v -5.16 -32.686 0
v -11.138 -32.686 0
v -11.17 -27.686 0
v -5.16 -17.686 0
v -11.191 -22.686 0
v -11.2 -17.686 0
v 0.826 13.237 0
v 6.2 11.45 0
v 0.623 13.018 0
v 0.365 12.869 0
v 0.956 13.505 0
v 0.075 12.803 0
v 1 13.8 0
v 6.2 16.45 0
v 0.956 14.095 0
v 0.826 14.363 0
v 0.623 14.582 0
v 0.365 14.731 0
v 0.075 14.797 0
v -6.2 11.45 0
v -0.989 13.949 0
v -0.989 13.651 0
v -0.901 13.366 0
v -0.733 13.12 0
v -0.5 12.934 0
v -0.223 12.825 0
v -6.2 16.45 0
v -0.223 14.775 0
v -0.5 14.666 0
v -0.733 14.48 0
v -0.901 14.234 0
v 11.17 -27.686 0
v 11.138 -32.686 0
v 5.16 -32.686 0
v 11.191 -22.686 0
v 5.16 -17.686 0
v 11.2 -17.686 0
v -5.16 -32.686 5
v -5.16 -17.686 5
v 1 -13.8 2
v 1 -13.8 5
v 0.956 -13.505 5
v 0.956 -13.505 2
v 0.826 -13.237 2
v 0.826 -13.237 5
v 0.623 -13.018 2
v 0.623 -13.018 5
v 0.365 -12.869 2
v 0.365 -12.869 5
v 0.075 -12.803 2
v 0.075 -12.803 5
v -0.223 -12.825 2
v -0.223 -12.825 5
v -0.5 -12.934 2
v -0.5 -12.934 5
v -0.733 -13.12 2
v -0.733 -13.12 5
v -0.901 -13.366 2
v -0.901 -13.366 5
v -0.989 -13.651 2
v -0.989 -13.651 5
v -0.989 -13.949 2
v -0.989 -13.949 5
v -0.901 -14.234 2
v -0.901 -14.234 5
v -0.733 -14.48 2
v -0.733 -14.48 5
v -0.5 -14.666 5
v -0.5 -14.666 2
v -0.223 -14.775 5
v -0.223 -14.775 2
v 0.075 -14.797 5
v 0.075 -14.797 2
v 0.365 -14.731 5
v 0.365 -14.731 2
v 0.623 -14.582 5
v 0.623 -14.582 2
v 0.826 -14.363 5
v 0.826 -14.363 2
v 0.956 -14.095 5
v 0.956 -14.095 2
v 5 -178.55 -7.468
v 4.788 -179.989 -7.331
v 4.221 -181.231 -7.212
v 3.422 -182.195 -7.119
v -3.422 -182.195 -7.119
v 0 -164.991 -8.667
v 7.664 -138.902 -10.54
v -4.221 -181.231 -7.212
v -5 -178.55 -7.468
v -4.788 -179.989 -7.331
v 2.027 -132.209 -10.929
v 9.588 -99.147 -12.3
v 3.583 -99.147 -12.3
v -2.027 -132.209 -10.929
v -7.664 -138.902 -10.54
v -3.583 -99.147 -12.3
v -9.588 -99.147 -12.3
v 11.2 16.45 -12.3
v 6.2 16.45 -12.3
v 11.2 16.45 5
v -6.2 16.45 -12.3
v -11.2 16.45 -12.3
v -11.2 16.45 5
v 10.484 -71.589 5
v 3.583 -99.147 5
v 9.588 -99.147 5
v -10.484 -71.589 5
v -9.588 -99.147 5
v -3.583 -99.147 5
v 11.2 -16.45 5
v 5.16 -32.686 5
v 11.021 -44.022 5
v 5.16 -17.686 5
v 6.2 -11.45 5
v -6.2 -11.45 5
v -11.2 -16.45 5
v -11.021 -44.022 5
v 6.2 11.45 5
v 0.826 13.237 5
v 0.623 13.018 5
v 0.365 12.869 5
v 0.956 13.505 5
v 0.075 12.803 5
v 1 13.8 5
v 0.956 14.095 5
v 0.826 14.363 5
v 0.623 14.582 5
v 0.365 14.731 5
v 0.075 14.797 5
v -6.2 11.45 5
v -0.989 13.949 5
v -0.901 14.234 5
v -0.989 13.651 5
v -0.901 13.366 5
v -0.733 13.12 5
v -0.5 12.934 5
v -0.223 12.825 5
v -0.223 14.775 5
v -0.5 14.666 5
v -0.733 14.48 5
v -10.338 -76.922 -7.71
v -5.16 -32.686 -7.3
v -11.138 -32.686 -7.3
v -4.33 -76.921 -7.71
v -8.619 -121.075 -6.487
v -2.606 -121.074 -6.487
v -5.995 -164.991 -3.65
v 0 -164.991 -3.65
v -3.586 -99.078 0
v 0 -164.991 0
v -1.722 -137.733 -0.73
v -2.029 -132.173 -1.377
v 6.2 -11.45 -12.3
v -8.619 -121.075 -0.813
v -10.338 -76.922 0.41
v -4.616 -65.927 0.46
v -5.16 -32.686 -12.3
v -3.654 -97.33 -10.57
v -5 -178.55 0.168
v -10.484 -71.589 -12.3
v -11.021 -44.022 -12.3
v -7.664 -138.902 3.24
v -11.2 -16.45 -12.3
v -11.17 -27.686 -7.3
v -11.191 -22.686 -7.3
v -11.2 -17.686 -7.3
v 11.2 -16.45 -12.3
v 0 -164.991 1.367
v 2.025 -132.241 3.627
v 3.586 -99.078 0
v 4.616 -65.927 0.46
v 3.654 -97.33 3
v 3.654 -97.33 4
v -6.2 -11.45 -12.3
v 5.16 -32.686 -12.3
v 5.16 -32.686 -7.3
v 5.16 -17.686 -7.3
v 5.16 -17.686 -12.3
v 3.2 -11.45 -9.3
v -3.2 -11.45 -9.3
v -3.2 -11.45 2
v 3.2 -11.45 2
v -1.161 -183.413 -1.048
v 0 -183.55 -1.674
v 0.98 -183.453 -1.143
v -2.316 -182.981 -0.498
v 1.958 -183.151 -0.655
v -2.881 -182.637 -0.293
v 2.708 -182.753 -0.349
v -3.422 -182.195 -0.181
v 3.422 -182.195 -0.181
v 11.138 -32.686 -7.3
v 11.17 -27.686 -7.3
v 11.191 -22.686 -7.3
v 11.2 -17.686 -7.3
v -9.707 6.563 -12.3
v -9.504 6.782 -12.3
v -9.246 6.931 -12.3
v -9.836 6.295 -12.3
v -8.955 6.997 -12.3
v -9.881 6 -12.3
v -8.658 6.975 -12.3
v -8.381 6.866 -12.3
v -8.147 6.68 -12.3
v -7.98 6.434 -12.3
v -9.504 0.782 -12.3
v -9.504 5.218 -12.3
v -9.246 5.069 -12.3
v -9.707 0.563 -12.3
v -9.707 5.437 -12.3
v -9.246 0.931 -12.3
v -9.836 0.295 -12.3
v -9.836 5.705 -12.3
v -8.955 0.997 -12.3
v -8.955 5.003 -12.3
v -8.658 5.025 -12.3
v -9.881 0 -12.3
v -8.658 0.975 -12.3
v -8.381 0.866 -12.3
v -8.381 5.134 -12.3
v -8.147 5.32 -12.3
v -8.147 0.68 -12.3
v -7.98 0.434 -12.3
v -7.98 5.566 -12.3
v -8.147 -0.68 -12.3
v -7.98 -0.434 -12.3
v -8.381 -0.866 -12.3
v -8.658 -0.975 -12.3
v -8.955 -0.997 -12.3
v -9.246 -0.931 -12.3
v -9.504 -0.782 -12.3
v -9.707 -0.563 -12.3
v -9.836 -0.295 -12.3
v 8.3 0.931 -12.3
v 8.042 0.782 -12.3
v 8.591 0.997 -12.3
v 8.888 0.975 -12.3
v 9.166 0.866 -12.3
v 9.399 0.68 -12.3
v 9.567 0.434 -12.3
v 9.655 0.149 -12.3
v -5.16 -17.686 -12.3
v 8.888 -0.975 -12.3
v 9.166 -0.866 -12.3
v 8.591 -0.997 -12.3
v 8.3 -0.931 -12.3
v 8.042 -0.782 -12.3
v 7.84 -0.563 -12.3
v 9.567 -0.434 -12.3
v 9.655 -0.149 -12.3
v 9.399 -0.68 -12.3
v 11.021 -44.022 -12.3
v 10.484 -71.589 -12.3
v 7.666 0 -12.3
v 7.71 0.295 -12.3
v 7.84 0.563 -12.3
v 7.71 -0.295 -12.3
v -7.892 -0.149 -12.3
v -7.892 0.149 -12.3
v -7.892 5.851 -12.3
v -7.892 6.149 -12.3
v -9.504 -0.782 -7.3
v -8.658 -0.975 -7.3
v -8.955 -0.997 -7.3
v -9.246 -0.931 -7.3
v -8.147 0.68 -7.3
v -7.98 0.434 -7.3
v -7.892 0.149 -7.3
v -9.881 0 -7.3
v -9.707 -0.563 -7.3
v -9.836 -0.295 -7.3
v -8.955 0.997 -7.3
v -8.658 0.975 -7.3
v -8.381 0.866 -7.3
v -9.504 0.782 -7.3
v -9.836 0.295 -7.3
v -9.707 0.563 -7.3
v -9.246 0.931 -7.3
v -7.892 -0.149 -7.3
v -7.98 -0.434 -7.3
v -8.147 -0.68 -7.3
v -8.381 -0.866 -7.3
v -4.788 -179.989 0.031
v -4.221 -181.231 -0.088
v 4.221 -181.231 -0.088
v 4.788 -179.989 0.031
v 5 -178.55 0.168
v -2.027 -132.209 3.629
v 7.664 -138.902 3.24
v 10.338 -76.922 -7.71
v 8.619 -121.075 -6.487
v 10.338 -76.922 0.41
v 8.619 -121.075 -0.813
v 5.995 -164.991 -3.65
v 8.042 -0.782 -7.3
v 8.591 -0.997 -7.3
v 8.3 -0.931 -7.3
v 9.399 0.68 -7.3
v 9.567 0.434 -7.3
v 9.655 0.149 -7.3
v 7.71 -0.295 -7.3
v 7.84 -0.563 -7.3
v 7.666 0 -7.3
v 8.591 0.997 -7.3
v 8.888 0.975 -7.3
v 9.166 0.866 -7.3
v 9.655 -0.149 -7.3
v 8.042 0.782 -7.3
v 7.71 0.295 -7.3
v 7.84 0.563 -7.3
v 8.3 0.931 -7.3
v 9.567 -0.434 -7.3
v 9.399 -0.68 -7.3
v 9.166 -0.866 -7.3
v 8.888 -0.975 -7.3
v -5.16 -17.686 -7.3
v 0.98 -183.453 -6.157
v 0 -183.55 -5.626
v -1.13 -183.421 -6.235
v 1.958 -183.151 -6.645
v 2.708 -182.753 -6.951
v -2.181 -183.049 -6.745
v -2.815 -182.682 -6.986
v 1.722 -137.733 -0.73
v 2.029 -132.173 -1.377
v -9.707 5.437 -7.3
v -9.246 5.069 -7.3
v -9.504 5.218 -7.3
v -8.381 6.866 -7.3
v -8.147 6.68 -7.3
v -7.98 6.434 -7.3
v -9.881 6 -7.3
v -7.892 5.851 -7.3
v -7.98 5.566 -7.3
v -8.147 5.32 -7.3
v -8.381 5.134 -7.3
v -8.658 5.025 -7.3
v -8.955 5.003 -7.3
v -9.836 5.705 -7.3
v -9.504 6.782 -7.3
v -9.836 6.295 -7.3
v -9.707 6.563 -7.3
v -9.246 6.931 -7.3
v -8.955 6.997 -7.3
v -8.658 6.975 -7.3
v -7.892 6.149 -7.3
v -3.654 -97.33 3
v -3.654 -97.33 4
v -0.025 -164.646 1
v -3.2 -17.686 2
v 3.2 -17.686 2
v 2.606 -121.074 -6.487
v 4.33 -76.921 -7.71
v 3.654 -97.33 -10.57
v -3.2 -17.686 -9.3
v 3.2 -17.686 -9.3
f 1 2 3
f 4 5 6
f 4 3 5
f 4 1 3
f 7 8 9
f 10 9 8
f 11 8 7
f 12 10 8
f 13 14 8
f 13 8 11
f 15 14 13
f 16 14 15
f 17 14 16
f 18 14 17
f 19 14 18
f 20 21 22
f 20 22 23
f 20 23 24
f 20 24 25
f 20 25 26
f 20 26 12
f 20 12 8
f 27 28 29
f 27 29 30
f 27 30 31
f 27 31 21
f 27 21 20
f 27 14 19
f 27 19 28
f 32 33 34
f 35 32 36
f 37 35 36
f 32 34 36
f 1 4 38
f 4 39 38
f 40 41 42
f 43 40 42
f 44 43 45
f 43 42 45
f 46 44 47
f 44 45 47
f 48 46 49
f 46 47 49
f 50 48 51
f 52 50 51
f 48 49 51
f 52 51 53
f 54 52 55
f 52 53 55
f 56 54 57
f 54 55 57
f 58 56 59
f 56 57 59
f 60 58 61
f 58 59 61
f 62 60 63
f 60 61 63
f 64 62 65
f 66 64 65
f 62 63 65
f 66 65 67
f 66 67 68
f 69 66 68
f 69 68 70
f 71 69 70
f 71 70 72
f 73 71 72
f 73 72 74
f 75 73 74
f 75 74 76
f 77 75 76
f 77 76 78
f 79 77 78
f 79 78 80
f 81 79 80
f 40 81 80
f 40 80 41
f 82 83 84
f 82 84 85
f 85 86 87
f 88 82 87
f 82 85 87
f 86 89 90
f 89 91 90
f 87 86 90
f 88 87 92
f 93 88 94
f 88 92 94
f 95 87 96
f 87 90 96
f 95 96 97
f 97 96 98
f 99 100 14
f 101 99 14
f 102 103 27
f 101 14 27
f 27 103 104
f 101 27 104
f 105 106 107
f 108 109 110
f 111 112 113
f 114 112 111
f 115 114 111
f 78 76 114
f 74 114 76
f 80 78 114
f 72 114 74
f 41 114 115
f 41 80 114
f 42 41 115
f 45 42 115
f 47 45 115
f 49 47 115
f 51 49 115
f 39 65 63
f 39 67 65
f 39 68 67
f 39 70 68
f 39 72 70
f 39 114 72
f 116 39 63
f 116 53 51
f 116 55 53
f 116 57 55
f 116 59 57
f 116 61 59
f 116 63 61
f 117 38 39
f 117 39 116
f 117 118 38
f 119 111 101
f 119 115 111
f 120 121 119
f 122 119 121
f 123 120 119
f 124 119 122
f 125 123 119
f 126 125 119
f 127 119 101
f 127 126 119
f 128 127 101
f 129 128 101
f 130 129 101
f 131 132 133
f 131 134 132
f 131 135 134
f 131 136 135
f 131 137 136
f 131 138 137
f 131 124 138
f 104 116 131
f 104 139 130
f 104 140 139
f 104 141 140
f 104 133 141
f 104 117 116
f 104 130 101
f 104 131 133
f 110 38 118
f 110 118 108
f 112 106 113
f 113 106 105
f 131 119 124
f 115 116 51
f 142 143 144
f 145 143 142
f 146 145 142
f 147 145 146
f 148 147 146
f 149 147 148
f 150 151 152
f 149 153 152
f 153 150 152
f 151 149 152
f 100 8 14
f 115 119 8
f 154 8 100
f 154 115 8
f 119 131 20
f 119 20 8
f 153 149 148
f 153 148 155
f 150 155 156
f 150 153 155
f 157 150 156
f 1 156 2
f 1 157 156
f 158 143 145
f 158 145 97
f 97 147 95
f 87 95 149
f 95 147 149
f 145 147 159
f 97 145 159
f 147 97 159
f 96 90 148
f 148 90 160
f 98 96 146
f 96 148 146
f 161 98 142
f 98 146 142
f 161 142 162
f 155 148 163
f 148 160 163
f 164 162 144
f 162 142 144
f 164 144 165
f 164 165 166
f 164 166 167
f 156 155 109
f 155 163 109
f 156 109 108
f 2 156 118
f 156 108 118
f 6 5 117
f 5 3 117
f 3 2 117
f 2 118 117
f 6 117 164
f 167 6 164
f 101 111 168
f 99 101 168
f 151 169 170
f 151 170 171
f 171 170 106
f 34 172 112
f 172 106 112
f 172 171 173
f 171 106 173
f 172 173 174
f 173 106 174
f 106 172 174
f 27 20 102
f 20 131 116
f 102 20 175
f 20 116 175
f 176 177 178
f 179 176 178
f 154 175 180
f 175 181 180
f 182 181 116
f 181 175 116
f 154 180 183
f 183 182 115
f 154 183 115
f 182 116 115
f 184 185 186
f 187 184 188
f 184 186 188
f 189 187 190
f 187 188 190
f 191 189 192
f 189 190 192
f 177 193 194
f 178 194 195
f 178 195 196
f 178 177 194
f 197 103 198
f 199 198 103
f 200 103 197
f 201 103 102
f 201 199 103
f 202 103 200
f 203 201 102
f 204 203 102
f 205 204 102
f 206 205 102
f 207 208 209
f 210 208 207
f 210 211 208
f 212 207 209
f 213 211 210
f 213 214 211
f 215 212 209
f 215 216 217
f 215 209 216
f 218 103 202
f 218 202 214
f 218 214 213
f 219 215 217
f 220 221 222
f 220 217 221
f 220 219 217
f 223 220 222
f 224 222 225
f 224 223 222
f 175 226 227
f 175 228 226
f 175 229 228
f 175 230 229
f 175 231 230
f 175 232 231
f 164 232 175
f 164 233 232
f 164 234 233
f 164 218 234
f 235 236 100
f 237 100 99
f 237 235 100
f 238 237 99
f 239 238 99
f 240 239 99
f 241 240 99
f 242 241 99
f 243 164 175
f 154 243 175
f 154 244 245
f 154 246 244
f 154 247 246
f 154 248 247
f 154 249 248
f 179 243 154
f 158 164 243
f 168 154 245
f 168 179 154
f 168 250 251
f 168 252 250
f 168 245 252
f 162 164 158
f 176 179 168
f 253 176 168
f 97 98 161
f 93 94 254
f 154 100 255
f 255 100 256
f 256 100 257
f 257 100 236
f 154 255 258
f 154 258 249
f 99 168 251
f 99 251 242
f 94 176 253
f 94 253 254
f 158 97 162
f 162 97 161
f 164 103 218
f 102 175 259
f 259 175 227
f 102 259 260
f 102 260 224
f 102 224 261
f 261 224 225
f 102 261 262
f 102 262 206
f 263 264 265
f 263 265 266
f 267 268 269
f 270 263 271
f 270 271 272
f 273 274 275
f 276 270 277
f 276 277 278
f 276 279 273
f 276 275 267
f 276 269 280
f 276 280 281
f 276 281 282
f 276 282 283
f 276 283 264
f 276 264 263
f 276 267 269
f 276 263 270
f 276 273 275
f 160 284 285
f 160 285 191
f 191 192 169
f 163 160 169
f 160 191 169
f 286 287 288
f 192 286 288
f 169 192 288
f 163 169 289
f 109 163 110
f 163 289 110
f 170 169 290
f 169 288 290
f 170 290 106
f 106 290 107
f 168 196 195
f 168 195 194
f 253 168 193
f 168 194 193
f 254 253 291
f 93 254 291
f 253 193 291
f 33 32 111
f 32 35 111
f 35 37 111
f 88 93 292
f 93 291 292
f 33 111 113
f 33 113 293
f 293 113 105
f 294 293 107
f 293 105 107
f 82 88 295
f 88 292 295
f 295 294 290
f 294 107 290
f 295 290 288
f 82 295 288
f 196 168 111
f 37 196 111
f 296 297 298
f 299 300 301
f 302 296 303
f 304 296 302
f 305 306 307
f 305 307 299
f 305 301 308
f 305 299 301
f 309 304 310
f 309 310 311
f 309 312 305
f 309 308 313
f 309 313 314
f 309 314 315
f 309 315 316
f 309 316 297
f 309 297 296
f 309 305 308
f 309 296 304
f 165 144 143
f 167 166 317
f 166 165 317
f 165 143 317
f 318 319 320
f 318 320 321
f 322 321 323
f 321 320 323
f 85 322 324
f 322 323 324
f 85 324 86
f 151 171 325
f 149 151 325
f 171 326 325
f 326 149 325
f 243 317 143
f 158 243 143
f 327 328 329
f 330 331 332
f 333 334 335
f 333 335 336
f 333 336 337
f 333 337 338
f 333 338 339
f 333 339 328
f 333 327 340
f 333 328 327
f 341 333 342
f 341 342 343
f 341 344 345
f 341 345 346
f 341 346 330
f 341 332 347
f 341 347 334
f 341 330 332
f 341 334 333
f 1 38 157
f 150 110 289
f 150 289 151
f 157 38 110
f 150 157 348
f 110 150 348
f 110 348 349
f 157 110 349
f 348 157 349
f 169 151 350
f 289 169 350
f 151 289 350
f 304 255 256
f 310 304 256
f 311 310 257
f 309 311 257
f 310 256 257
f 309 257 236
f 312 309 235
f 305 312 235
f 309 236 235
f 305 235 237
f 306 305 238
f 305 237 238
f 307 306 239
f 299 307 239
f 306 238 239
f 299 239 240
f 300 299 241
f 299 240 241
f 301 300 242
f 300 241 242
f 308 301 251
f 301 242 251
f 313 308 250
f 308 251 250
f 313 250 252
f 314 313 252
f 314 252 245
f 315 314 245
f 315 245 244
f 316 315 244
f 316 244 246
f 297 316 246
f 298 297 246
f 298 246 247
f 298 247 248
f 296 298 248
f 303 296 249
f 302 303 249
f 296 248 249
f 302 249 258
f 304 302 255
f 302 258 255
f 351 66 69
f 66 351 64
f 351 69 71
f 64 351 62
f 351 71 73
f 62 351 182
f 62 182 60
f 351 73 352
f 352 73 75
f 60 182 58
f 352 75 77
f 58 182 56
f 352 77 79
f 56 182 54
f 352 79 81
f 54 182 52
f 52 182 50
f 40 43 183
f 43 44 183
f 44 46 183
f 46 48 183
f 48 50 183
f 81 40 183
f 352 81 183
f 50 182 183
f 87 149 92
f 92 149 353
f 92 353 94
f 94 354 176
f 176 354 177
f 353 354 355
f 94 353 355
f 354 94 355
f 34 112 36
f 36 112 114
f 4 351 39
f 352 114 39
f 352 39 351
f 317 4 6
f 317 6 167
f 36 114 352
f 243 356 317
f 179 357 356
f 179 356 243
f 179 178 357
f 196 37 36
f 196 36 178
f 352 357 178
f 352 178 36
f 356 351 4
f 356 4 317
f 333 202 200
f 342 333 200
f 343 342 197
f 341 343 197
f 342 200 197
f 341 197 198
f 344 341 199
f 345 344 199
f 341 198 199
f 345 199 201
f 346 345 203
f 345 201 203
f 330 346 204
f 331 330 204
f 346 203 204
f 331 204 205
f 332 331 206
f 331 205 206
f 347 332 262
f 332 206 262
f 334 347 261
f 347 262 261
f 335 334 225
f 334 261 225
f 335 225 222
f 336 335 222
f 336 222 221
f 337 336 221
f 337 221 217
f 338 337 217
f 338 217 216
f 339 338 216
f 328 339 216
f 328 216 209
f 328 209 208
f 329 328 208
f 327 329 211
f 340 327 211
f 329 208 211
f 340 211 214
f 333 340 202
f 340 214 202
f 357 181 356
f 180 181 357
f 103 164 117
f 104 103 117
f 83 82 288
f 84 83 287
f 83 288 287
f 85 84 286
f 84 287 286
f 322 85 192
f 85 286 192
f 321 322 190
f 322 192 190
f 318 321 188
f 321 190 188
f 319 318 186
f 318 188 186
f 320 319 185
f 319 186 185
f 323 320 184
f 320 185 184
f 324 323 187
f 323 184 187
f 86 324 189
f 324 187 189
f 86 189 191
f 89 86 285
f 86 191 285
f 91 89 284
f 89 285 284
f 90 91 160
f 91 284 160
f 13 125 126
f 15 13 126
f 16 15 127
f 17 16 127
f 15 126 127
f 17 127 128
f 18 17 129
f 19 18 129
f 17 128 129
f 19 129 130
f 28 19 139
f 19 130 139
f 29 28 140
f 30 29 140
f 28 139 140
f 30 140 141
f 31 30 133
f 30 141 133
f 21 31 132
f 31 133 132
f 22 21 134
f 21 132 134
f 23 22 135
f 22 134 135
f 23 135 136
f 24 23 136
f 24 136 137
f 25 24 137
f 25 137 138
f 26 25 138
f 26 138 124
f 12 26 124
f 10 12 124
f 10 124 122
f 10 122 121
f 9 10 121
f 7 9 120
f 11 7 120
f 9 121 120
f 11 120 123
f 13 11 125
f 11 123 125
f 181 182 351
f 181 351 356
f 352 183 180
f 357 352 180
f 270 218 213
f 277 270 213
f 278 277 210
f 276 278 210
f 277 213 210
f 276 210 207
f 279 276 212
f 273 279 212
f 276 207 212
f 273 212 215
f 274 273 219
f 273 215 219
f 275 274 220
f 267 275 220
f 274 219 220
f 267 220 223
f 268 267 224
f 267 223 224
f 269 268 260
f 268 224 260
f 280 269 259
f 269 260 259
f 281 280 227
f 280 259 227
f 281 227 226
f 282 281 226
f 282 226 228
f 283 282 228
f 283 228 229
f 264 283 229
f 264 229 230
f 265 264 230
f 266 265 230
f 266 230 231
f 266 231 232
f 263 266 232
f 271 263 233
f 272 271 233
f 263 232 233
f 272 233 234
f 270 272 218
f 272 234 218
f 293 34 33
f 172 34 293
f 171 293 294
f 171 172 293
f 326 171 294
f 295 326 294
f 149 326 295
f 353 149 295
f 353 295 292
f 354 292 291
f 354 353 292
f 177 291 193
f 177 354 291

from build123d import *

# Parameters (mm, degrees)
BOSS_EXTRUDE2_DEPTH      = 5
SKETCH4_W                = 12.4
SKETCH4_H                = 22.9
CUT_EXTRUDE1_DEPTH       = 5
SKETCH5_R                = 1
CUT_EXTRUDE2_DEPTH       = 5
CUT_EXTRUDE3_DEPTH       = 5
SKETCH6_W                = 5
SKETCH6_H                = 22.9
BOSS_EXTRUDE3_DEPTH      = 12.3
SKETCH7_R                = 1
CUT_EXTRUDE4_DEPTH       = 5
BOSS_EXTRUDE4_DEPTH      = 12.3
CUT_EXTRUDE5_DEPTH       = 121
CUT_EXTRUDE7_DEPTH       = 185.302285774
CUT_EXTRUDE8_DEPTH       = 121
CUT_EXTRUDE12_DEPTH      = 60.5
CUT_EXTRUDE13_REACH      = 174.902
SKETCH16_W               = 6.4
SKETCH16_H               = 11.3
CUT_EXTRUDE14_DEPTH      = 185.703363647
SKETCH23_W               = 7.3
SKETCH23_H               = 15
CUT_EXTRUDE15_DEPTH      = 185.687725676
CUT_EXTRUDE15_DEPTH_BACK = 185.687725676
SKETCH24_W               = 5
SKETCH24_H               = 12.3
BOSS_EXTRUDE5_DEPTH      = 5
BOSS_EXTRUDE6_REACH      = 187.32
SKETCH25_W               = 17.3
SKETCH25_H               = 5
BOSS_EXTRUDE7_REACH      = 187.32
SKETCH26_W               = 5
SKETCH26_H               = 5


with BuildPart() as part:
    # Sketch1 → Boss-Extrude2 (new body)
    with BuildSketch(Plane.XY):
        with BuildLine():
            Line((-6.2, 16.45), (6.2, 16.45))
            ThreePointArc((6.2, 16.45), (9.735533906, 14.985533906), (11.2, 11.45))
            Line((11.2, 11.45), (11.2, -16.45))
            ThreePointArc((11.2, -16.45), (9.649433537, -97.559262726), (5, -178.55))
            ThreePointArc((5, -178.55), (0, -183.55), (-5, -178.55))
            ThreePointArc((-5, -178.55), (-9.649433537, -97.559262726), (-11.2, -16.45))
            Line((-11.2, -16.45), (-11.2, 11.45))
            ThreePointArc((-11.2, 11.45), (-9.735533906, 14.985533906), (-6.2, 16.45))
        make_face()
    extrude(amount=BOSS_EXTRUDE2_DEPTH)

    # Sketch4 → Cut-Extrude1 (cut)
    with BuildSketch(Plane.XY.offset(5)):
        Rectangle(SKETCH4_W, SKETCH4_H)
    extrude(amount=-CUT_EXTRUDE1_DEPTH, mode=Mode.SUBTRACT)

    # Sketch5 → Cut-Extrude2 (cut)
    with BuildSketch(Plane.XY.offset(5)):
        with Locations((0, 13.8)):
            Circle(SKETCH5_R)
        with Locations((0, -13.8)):
            Circle(SKETCH5_R)
    extrude(amount=-CUT_EXTRUDE2_DEPTH, mode=Mode.SUBTRACT)

    # 3DSketch1 → Cut-Extrude3 (cut)
    with BuildSketch(Plane(origin=(-5.160423987, -32.686439405, 5), x_dir=(0.03897452460138957, -0.9992402045715013, 0), z_dir=(0, 0, 1))):
        with BuildLine():
            Line((0, 0), (0.402250143, 10.313006243))
            add(Edge.make_bspline(
                [(132.405052787, 0), (132.33638536, 0.007627552), (132.26771744, 0.015250757), (132.19904902, 0.022869576), (126.769998736, 0.624873123), (121.337777255, 1.198987474), (115.971798773, 1.743277878), (102.55225111, 3.059162741), (89.125108856, 4.291856269), (81.065896409, 4.997231834), (64.94123124, 6.330918517), (48.803313346, 7.493309622), (40.731510594, 8.035951572), (27.824174172, 8.848610973), (14.911969374, 9.58457196), (10.076236862, 9.846020434), (5.23968635, 10.089957993), (0.402250143, 10.313006243)],
                knots=[0, 0, 0, 0, 0, 0, 0.002323761, 0.002323761, 0.002323761, 0.183719441, 0.183719441, 0.183719441, 0.455812961, 0.455812961, 0.455812961, 0.72790648, 0.72790648, 0.72790648, 0.890780205, 0.890780205, 0.890780205, 0.890780205, 0.890780205, 0.890780205], degree=5))
            add(Edge.make_bspline(
                [(0, 0), (4.840113133, -0.15441643), (9.680970327, -0.287938029), (14.522375928, -0.403938196), (27.452676969, -0.675942436), (40.384098451, -0.871102077), (48.473645133, -0.958819983), (64.653074032, -1.056939836), (80.832632652, -0.983252259), (88.922302572, -0.907750283), (102.404667084, -0.724639456), (115.885939838, -0.457998492), (121.278011015, -0.333316775), (126.738446926, -0.184061374), (132.197893558, -0.0067545), (132.266946789, -0.004507398), (132.335999865, -0.002255886), (132.405052787, 0)],
                knots=[0.109219795, 0.109219795, 0.109219795, 0.109219795, 0.109219795, 0.109219795, 0.27209352, 0.27209352, 0.27209352, 0.544187039, 0.544187039, 0.544187039, 0.816280559, 0.816280559, 0.816280559, 0.997676239, 0.997676239, 0.997676239, 1, 1, 1, 1, 1, 1], degree=5))
        make_face()
    extrude(amount=-CUT_EXTRUDE3_DEPTH, mode=Mode.SUBTRACT)

    # Sketch6 → Boss-Extrude3 (add)
    with BuildSketch(Plane(origin=(0, 0, 0), x_dir=(-1, 0, 0), z_dir=(0, 0, -1))):
        with Locations((-8.7, 0)):
            Rectangle(SKETCH6_W, SKETCH6_H)
        with Locations((8.7, 0)):
            Rectangle(SKETCH6_W, SKETCH6_H)
    extrude(amount=BOSS_EXTRUDE3_DEPTH)

    # Sketch7 → Cut-Extrude4 (cut)
    with BuildSketch(Plane(origin=(0, 0, -12.3), x_dir=(-1, 0, 0), z_dir=(0, 0, -1))):
        with Locations((-8.665838134, 0)):
            Circle(SKETCH7_R)
        with Locations((8.880503913, 0)):
            Circle(SKETCH7_R)
        with Locations((8.880503913, 6)):
            Circle(SKETCH7_R)
    extrude(amount=-CUT_EXTRUDE4_DEPTH, mode=Mode.SUBTRACT)

    # Sketch8 → Boss-Extrude4 (add)
    with BuildSketch(Plane(origin=(0, 0, 0), x_dir=(-1, 0, 0), z_dir=(0, 0, -1))):
        with BuildLine():
            Line((11.2, -16.45), (11.2, -11.45))
            Line((11.2, -11.45), (6.2, -11.45))
            Line((6.2, -11.45), (-6.2, -11.45))
            Line((-6.2, -11.45), (-11.2, -11.45))
            Line((-11.2, -11.45), (-11.2, -16.45))
            ThreePointArc((-11.2, -16.45), (-9.649433537, -97.559262726), (-5, -178.55))
            ThreePointArc((-5, -178.55), (0, -183.55), (5, -178.55))
            ThreePointArc((5, -178.55), (9.649433537, -97.559262726), (11.2, -16.45))
        make_face()
    extrude(amount=BOSS_EXTRUDE4_DEPTH)

    # Sketch10 → Cut-Extrude5 (cut)
    with BuildSketch(Plane.XY):
        with BuildLine():
            Line((5.16042399, -32.686439405), (-5.160423987, -32.686439405))
            add(Edge.make_bspline(
                [(-5.160423987, -32.686439405), (-5.126081984, -37.528893349), (-5.070832025, -42.371276423), (-4.998052574, -47.213524597), (-4.765897811, -60.144602491), (-4.456913166, -73.073804992), (-4.229278188, -81.160624037), (-3.69673794, -97.331584054), (-2.992515745, -113.495977582), (-2.601780096, -121.576558353), (-1.893339649, -135.041542369), (-1.10147508, -148.502179909), (-0.766734685, -153.885294805), (-0.404774794, -159.335764743), (-0.0148233, -164.784152861), (-0.009886589, -164.853066046), (-0.004945476, -164.921978904), (1e-09, -164.990891438)],
                knots=[0.109219795, 0.109219795, 0.109219795, 0.109219795, 0.109219795, 0.109219795, 0.27209352, 0.27209352, 0.27209352, 0.544187039, 0.544187039, 0.544187039, 0.816280559, 0.816280559, 0.816280559, 0.997676239, 0.997676239, 0.997676239, 1, 1, 1, 1, 1, 1], degree=5))
            add(Edge.make_bspline(
                [(1e-09, -164.990891438), (0.004945477, -164.921978904), (0.00988659, -164.853066046), (0.014823301, -164.784152861), (0.404774795, -159.335764743), (0.766734686, -153.885294805), (1.101475081, -148.502179909), (1.89333965, -135.041542369), (2.601780097, -121.576558353), (2.992515747, -113.495977582), (3.696737942, -97.331584054), (4.22927819, -81.160624037), (4.456913168, -73.073804992), (4.765897813, -60.144602491), (4.998052577, -47.213524597), (5.070832028, -42.371276423), (5.126081987, -37.528893349), (5.16042399, -32.686439405)],
                knots=[0, 0, 0, 0, 0, 0, 0.002323761, 0.002323761, 0.002323761, 0.183719441, 0.183719441, 0.183719441, 0.455812961, 0.455812961, 0.455812961, 0.72790648, 0.72790648, 0.72790648, 0.890780205, 0.890780205, 0.890780205, 0.890780205, 0.890780205, 0.890780205], degree=5))
        make_face()
    extrude(amount=-CUT_EXTRUDE5_DEPTH, mode=Mode.SUBTRACT)

    # Sketch12 → Cut-Extrude7 (cut, through all)
    with BuildSketch(Plane(origin=(0, 0, 0), x_dir=(0, 0, -1), z_dir=(1, 0, 0))):
        with BuildLine():
            Line((0, -32.686439405), (7.3, -32.686439405))
            ThreePointArc((7.3, -32.686439405), (7.305216991, -98.889157238), (3.65, -164.99089144))
            ThreePointArc((3.65, -164.99089144), (-0.005216991, -98.889157238), (0, -32.686439405))
        make_face()
    extrude(amount=-CUT_EXTRUDE7_DEPTH, mode=Mode.SUBTRACT)

    # Sketch14 → Cut-Extrude8 (cut)
    with BuildSketch(Plane(origin=(0, 0, 0), x_dir=(0, 0, -1), z_dir=(1, 0, 0))):
        with BuildLine():
            Line((7.3, -32.686439405), (0, -32.686439405))
            ThreePointArc((0, -32.686439405), (-0.005216991, -98.889157238), (3.65, -164.99089144))
            ThreePointArc((3.65, -164.99089144), (7.305216991, -98.889157238), (7.3, -32.686439405))
        make_face()
    extrude(amount=CUT_EXTRUDE8_DEPTH, mode=Mode.SUBTRACT)

    # Sketch15 → Cut-Extrude12 (cut, symmetric)
    with BuildSketch(Plane(origin=(0, 0, 0), x_dir=(0, 0, -1), z_dir=(1, 0, 0))):
        with BuildLine():
            Line((12.301916168, -32.686439405), (24.156676666, -32.686439405))
            Line((24.156676666, -32.686439405), (24.156676666, -183.55))
            Line((24.156676666, -183.55), (5.626116445, -183.55))
            ThreePointArc((5.626116445, -183.55), (6.634148123, -183.160797973), (7.119075837, -182.195162848))
            ThreePointArc((7.119075837, -182.195162848), (12.038912499, -107.52151756), (12.301916168, -32.686439405))
        make_face()
        with BuildLine():
            Line((-5.001916168, -32.686439405), (-15.644111431, -32.686439405))
            Line((-15.644111431, -32.686439405), (-15.644111431, -183.55))
            Line((-15.644111431, -183.55), (1.673883555, -183.55))
            ThreePointArc((1.673883555, -183.55), (0.665851877, -183.160797973), (0.180924163, -182.195162848))
            ThreePointArc((0.180924163, -182.195162848), (-4.738912499, -107.52151756), (-5.001916168, -32.686439405))
        make_face()
    extrude(amount=CUT_EXTRUDE12_DEPTH, both=True, mode=Mode.SUBTRACT)

    # Sketch16 → Cut-Extrude13 (cut, up to next)
    with BuildSketch(Plane(origin=(0, -11.45, 0), x_dir=(1, 0, 0), z_dir=(0, 1, 0)), mode=Mode.PRIVATE) as cut_extrude13_sk1:
        with Locations((0, 3.65)):
            Rectangle(SKETCH16_W, SKETCH16_H)
    cut_extrude13_tool1 = extrude(cut_extrude13_sk1.sketch, amount=-CUT_EXTRUDE13_REACH, mode=Mode.PRIVATE) & part.part
    add(cut_extrude13_tool1.solids().sort_by_distance((0, -11.45, -3.65))[0], mode=Mode.SUBTRACT)

    # Sketch21 → Cut-Extrude14 (cut, through all)
    with BuildSketch(Plane.XY.offset(5)):
        Polygon((-5.160423987, -32.686439405), (5.16042399, -32.686439405), (5.160423987, -17.686439405), (-5.160423987, -17.686439405), align=None)
    extrude(amount=-CUT_EXTRUDE14_DEPTH, mode=Mode.SUBTRACT)

    # Sketch23 → Cut-Extrude15 (cut, two sides)
    with BuildSketch(Plane(origin=(-5.160423987, 0, 0), x_dir=(0, 0, -1), z_dir=(1, 0, 0))) as cut_extrude15_sk:
        with Locations((3.65, -25.186439405)):
            Rectangle(SKETCH23_W, SKETCH23_H)
    extrude(amount=CUT_EXTRUDE15_DEPTH, mode=Mode.SUBTRACT)
    extrude(cut_extrude15_sk.sketch, amount=-CUT_EXTRUDE15_DEPTH_BACK, mode=Mode.SUBTRACT)

    # Sketch24 → Boss-Extrude5 (add)
    with BuildSketch(Plane(origin=(0, 11.45, 0), x_dir=(1, 0, 0), z_dir=(0, 1, 0))):
        with Locations((8.7, 6.15)):
            Rectangle(SKETCH24_W, SKETCH24_H)
        with Locations((-8.7, 6.15)):
            Rectangle(SKETCH24_W, SKETCH24_H)
    extrude(amount=BOSS_EXTRUDE5_DEPTH)

    # Sketch25 → Boss-Extrude6 (add, up to next)
    with BuildSketch(Plane(origin=(11.2, 0, 0), x_dir=(0, 0, -1), z_dir=(1, 0, 0)), mode=Mode.PRIVATE) as boss_extrude6_sk1:
        with Locations((3.65, 13.95)):
            Rectangle(SKETCH25_W, SKETCH25_H)
    boss_extrude6_tool1 = extrude(boss_extrude6_sk1.sketch, amount=-BOSS_EXTRUDE6_REACH, mode=Mode.PRIVATE) - part.part
    add(boss_extrude6_tool1.solids().sort_by_distance((11.2, 13.95, -3.65))[0])

    # Sketch26 → Boss-Extrude7 (add, up to next)
    with BuildSketch(Plane.ZY.offset(11.2), mode=Mode.PRIVATE) as boss_extrude7_sk1:
        with Locations((2.5, 13.95)):
            Rectangle(SKETCH26_W, SKETCH26_H)
    boss_extrude7_tool1 = extrude(boss_extrude7_sk1.sketch, amount=-BOSS_EXTRUDE7_REACH, mode=Mode.PRIVATE) - part.part
    add(boss_extrude7_tool1.solids().sort_by_distance((-11.2, 13.95, 2.5))[0])


solid = part.part
